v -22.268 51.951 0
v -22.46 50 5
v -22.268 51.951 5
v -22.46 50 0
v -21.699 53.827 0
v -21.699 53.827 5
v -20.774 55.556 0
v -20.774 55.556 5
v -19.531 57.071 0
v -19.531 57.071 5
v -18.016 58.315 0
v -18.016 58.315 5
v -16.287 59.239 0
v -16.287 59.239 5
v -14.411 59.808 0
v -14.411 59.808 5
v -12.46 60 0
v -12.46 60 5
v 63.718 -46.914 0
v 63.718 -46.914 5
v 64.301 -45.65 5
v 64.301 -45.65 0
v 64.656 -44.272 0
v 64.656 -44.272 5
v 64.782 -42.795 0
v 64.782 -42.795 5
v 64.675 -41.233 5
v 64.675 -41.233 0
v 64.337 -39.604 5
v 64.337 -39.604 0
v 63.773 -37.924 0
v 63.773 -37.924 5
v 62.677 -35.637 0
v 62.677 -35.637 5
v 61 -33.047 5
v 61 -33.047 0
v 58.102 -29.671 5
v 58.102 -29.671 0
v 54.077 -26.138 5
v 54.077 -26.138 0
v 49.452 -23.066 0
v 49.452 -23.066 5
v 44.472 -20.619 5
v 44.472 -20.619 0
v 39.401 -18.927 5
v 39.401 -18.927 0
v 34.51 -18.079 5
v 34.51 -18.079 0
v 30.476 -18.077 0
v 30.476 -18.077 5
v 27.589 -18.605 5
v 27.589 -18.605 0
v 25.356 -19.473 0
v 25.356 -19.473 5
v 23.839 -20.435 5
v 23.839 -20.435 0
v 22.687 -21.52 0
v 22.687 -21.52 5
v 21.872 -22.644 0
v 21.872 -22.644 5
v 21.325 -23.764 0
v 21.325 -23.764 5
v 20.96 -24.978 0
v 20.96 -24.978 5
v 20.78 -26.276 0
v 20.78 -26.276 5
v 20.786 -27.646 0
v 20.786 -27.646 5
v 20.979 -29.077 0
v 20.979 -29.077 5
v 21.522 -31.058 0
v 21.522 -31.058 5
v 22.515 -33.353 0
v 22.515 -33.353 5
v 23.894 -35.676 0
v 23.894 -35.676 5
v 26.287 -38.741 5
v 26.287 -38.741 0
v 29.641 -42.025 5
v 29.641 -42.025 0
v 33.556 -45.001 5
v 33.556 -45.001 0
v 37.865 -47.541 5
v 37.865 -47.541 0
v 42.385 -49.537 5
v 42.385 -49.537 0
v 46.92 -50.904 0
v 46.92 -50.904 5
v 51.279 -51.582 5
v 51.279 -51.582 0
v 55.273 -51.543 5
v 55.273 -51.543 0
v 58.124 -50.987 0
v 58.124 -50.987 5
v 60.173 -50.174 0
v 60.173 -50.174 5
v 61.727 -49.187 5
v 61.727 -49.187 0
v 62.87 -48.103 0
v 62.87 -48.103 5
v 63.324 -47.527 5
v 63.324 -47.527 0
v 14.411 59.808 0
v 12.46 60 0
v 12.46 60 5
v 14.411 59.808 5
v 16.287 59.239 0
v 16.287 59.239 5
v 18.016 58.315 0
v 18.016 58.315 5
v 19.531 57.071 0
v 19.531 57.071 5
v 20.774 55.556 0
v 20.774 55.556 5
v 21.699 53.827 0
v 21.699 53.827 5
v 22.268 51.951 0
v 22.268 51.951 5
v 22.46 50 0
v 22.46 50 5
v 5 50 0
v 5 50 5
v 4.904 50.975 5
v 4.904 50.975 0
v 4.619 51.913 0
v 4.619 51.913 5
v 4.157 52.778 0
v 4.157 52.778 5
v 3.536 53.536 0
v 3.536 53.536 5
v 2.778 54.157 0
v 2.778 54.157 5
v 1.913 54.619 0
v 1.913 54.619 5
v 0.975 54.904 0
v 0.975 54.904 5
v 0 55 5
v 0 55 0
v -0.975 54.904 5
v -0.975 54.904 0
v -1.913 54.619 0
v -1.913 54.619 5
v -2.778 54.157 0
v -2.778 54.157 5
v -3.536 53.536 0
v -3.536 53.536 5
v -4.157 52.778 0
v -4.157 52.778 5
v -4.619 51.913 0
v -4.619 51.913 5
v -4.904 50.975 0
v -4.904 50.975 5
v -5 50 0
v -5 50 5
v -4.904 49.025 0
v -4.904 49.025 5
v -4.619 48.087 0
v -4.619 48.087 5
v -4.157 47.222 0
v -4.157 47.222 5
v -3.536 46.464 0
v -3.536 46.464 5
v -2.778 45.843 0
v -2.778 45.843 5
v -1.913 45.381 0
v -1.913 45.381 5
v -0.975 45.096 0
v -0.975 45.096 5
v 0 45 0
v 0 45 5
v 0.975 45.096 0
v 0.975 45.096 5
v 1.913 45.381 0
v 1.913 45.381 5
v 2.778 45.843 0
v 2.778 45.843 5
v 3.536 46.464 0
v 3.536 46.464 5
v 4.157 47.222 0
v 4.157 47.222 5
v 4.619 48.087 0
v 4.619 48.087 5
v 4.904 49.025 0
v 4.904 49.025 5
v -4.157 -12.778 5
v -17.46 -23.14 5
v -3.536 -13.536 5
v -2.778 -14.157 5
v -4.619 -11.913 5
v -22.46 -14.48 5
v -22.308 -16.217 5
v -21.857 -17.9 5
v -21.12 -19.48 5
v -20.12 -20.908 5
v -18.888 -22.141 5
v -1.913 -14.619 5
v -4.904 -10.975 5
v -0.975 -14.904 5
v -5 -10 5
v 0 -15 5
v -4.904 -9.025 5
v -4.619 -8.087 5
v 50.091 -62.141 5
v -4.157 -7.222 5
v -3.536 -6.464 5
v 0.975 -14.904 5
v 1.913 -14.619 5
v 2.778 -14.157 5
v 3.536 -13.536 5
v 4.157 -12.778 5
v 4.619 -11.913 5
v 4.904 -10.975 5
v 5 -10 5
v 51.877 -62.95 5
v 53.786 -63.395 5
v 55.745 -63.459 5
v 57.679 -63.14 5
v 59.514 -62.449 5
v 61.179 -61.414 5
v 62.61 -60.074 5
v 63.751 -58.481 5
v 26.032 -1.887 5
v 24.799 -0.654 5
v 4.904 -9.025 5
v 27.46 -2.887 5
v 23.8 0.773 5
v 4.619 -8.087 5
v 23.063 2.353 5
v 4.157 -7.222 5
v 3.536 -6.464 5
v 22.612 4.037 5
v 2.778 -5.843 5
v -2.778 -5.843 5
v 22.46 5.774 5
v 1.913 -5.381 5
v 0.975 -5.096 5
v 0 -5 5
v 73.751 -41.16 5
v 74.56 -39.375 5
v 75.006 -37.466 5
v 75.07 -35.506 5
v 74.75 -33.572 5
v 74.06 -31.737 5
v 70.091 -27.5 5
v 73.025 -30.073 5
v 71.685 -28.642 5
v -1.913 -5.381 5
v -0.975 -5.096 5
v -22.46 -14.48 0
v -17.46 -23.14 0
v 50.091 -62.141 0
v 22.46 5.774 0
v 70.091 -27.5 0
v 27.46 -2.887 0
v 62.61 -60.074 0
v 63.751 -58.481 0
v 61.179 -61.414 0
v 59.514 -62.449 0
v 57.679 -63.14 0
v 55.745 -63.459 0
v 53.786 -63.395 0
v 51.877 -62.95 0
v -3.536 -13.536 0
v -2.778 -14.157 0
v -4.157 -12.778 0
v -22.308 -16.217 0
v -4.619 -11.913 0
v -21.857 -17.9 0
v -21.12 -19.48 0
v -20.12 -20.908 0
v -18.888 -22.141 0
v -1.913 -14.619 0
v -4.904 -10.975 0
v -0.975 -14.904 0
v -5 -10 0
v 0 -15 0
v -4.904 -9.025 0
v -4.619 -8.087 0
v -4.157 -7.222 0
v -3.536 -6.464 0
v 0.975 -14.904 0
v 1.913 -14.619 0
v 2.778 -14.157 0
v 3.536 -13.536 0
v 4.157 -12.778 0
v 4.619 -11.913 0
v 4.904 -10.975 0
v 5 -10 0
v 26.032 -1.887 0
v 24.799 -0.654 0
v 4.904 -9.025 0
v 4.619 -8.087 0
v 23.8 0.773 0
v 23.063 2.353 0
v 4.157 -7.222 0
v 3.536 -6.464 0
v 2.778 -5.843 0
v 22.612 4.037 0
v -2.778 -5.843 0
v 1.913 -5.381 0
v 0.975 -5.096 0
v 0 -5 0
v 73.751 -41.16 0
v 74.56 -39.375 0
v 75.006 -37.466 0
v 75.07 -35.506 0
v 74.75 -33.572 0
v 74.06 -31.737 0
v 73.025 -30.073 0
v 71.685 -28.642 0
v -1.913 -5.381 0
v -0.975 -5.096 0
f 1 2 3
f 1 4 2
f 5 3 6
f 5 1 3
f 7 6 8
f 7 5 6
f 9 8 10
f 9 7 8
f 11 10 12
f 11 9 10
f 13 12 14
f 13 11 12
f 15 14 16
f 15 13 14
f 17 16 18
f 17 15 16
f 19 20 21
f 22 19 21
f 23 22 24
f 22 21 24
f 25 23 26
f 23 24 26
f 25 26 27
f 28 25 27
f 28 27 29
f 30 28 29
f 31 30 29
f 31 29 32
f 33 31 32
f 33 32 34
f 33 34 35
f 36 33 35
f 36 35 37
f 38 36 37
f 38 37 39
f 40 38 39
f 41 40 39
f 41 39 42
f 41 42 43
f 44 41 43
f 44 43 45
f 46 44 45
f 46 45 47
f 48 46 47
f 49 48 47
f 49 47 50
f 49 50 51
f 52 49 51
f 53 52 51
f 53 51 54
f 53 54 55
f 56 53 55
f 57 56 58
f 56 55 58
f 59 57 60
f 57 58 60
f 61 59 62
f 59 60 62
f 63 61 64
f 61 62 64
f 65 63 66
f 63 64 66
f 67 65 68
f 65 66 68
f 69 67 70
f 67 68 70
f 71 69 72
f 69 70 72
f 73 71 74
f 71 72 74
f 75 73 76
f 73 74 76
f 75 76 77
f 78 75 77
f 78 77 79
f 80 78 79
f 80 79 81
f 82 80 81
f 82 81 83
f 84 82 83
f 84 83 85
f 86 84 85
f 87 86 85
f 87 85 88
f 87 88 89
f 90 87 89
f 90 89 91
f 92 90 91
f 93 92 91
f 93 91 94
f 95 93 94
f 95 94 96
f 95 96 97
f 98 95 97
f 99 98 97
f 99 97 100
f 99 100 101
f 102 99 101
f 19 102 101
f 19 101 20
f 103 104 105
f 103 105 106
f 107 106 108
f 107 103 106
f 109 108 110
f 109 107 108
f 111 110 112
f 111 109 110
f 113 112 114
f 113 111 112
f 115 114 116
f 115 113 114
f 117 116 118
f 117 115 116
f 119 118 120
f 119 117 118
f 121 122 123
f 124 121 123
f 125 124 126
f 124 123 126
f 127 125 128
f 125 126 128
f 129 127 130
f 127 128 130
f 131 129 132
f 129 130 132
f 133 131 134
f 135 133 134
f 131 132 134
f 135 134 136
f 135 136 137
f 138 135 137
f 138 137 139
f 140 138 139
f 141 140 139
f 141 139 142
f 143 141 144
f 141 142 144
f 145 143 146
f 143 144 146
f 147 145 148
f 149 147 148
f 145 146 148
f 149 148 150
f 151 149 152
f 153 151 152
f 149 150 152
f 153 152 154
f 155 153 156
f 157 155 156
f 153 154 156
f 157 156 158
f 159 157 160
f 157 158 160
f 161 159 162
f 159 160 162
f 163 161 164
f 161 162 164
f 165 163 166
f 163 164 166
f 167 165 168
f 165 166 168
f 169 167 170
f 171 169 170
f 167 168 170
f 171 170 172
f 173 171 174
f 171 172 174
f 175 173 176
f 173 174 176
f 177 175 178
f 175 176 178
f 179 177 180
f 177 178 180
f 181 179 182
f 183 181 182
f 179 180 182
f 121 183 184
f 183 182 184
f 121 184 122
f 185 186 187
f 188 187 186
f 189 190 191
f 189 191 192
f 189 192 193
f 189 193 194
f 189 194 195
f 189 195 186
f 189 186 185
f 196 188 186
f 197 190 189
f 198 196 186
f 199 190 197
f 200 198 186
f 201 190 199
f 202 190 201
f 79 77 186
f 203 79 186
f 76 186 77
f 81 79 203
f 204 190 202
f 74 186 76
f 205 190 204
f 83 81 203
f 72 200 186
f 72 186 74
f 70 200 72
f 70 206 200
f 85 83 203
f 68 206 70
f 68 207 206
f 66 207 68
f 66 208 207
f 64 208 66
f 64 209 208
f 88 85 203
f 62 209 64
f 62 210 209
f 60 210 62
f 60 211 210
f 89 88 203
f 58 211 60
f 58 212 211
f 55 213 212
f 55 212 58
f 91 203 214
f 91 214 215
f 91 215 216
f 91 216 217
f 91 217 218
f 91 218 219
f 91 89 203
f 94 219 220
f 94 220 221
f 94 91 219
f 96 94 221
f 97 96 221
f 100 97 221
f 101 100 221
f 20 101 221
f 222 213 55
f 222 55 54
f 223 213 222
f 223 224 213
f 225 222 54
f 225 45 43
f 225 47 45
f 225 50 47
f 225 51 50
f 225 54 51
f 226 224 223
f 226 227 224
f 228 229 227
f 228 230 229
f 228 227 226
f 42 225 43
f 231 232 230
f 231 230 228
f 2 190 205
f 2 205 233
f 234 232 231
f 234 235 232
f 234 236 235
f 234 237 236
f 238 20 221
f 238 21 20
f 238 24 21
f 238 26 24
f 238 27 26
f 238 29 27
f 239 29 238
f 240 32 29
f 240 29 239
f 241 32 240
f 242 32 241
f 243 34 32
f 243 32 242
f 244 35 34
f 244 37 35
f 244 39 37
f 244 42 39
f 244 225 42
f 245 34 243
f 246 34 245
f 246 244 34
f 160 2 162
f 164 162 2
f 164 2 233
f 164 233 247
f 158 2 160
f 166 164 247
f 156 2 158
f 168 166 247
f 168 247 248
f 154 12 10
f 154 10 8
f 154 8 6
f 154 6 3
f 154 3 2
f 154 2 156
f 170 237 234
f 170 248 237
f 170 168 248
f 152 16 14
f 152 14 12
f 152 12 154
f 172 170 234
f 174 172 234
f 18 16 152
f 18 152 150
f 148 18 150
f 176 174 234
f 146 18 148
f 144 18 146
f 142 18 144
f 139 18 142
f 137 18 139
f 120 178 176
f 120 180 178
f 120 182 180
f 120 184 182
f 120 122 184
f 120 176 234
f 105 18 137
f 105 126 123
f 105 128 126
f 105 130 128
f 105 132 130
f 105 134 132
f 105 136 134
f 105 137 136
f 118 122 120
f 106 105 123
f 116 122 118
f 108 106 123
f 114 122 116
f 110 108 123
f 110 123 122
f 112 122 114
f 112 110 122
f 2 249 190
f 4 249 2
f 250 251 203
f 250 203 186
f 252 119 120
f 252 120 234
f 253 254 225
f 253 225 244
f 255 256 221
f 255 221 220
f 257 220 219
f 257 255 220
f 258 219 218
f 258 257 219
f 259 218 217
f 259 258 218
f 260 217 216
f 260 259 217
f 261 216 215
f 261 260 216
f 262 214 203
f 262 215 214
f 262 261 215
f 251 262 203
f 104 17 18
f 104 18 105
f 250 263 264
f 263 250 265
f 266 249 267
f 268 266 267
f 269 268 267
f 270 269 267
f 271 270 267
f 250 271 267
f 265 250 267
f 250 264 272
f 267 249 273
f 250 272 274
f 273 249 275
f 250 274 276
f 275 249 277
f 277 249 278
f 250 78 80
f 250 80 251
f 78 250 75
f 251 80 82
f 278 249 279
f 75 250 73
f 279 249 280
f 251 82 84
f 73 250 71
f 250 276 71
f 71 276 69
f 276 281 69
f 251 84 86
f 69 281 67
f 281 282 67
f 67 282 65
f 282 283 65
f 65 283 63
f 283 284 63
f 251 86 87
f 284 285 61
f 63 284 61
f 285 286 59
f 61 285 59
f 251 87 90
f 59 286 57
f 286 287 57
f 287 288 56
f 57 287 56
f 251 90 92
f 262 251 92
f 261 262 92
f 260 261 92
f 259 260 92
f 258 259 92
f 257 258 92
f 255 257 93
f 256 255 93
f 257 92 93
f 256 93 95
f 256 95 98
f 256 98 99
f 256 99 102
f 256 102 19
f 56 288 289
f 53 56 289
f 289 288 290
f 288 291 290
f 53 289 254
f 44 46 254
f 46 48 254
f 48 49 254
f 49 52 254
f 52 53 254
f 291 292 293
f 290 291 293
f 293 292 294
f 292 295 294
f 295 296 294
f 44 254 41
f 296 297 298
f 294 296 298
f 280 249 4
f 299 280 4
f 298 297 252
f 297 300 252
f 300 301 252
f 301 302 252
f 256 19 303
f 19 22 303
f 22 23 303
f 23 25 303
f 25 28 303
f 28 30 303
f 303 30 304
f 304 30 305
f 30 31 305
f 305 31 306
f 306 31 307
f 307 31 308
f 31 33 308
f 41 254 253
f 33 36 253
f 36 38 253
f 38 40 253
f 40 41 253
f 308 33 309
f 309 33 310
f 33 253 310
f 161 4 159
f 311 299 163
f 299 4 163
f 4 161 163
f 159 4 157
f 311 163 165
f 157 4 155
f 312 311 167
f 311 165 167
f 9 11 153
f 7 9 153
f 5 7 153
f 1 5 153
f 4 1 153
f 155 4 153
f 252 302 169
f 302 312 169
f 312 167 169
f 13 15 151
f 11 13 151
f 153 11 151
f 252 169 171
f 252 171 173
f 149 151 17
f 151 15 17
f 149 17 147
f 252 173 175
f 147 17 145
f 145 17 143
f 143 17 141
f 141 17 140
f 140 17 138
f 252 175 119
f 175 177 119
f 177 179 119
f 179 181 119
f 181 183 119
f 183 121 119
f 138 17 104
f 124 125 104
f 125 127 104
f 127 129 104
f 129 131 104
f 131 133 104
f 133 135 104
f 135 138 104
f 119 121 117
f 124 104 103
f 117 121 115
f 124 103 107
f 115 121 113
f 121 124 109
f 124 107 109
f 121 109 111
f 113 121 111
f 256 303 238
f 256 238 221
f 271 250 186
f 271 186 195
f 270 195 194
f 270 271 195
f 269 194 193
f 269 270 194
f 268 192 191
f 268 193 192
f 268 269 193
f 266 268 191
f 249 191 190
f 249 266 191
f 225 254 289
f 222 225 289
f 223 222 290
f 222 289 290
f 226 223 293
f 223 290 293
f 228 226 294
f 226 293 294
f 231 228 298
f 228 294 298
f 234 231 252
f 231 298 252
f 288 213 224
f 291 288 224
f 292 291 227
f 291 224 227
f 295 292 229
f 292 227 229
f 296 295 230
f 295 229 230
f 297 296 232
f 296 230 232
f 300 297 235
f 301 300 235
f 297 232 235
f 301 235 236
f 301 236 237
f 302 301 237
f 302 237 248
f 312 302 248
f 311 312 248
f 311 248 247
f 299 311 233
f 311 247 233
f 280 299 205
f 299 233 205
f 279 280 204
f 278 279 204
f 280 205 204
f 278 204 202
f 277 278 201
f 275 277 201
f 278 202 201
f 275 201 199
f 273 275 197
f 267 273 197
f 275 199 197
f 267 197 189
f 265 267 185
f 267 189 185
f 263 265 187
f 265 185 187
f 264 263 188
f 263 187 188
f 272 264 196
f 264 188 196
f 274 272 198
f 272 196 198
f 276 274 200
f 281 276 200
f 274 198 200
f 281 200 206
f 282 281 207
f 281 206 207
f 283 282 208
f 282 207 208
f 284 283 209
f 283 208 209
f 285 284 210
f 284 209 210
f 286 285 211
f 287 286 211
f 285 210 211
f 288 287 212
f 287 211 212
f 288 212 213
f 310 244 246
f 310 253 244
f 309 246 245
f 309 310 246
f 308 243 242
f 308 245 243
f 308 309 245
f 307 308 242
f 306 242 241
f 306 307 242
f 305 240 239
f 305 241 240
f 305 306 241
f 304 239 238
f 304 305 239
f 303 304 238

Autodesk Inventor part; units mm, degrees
ref_plane "YZ Plane" through (0, 0, 0) normal (1, 0, 0) x (0, 1, 0)
ref_plane "XZ Plane" through (0, 0, 0) normal (0, 1, 0) x (-1, 0, 0)
ref_plane "XY Plane" through (0, 0, 0) normal (0, 0, 1) x (1, 0, 0)
sketch "Sketch1" plane through (0, 0, 0) normal (0, 0, 1) x (1, 0, 0)
  line L0 (-12.4598, 60) -> (12.4598, 60)
  line L1 (-22.4598, -14.4802) -> (-22.4598, 50)
  arc A0 (-12.4598, 60) -> (-22.4598, 50) centre (-12.4598, 50) ccw
  arc A1 (22.4598, 50) -> (12.4598, 60) centre (12.4598, 50) ccw
  line L2 (27.4598, -2.8868) -> (70.0912, -27.5)
  line L3 (22.4598, 0) -> (71.6863, 0) construction
  line L4 (73.7514, -41.1603) -> (63.7514, -58.4808)
  line L5 (50.0912, -62.141) -> (-17.4598, -23.1405)
  line L6 (22.4598, 50) -> (22.4598, 5.7735)
  arc A2 (-22.4598, -14.4802) -> (-17.4598, -23.1405) centre (-12.4598, -14.4802) ccw
  arc A3 (22.4598, 5.7735) -> (27.4598, -2.8868) centre (32.4598, 5.7735) ccw
  arc A4 (73.7514, -41.1603) -> (70.0912, -27.5) centre (65.0912, -36.1603) ccw
  arc A5 (50.0912, -62.141) -> (63.7514, -58.4808) centre (55.0912, -53.4808) ccw
  point P0 (0, 0)
  point P1 (0, 60)
  point P2 (78.7514, -32.5)
  point P3 (58.7514, -67.141)
  dimension "d0" = 10
  dimension "d11" = 65
  dimension "d12" = 30
  dimension "d13" = 40
  dimension "d14" = 10
extrude "Extrusion1" add sketch "Sketch1" along normal blind 5
sketch "Sketch2" plane through (0, 0, 5) normal (0, 0, 1) x (1, 0, 0)
  circle A0 centre (0, 50) radius 5
  line L0 (-22.4598, 50) -> (-22.4598, -14.4802) construction
  line L1 (-22.4598, 17.7599) -> (22.4598, 27.8868) construction
  line L2 (22.4598, 5.7735) -> (22.4598, 50) construction
  line L3 (12.4598, 60) -> (-12.4598, 60) projected
  circle A1 centre (0, -10) radius 5
  line L4 (63.7514, -58.4808) -> (73.7514, -41.1603) projected
  ellipse E0 centre (42.7707, -34.8205) end of major axis (63.7179, -46.9144) minor radius 13.5207
  line L5 (70.0912, -27.5) -> (27.4598, -2.8868) projected
  point P0 (0, 0)
  point P1 (0, 22.8233)
  dimension "d5" = 10
  dimension "d7" = 10
  dimension "d15" = 10
  dimension "d16" = 10
  dimension "d19" = 30
  dimension "d20" = 20
extrude "Extrusion2" cut sketch "Sketch2" against normal up to surface (5 mm away)
properties part number "base"
